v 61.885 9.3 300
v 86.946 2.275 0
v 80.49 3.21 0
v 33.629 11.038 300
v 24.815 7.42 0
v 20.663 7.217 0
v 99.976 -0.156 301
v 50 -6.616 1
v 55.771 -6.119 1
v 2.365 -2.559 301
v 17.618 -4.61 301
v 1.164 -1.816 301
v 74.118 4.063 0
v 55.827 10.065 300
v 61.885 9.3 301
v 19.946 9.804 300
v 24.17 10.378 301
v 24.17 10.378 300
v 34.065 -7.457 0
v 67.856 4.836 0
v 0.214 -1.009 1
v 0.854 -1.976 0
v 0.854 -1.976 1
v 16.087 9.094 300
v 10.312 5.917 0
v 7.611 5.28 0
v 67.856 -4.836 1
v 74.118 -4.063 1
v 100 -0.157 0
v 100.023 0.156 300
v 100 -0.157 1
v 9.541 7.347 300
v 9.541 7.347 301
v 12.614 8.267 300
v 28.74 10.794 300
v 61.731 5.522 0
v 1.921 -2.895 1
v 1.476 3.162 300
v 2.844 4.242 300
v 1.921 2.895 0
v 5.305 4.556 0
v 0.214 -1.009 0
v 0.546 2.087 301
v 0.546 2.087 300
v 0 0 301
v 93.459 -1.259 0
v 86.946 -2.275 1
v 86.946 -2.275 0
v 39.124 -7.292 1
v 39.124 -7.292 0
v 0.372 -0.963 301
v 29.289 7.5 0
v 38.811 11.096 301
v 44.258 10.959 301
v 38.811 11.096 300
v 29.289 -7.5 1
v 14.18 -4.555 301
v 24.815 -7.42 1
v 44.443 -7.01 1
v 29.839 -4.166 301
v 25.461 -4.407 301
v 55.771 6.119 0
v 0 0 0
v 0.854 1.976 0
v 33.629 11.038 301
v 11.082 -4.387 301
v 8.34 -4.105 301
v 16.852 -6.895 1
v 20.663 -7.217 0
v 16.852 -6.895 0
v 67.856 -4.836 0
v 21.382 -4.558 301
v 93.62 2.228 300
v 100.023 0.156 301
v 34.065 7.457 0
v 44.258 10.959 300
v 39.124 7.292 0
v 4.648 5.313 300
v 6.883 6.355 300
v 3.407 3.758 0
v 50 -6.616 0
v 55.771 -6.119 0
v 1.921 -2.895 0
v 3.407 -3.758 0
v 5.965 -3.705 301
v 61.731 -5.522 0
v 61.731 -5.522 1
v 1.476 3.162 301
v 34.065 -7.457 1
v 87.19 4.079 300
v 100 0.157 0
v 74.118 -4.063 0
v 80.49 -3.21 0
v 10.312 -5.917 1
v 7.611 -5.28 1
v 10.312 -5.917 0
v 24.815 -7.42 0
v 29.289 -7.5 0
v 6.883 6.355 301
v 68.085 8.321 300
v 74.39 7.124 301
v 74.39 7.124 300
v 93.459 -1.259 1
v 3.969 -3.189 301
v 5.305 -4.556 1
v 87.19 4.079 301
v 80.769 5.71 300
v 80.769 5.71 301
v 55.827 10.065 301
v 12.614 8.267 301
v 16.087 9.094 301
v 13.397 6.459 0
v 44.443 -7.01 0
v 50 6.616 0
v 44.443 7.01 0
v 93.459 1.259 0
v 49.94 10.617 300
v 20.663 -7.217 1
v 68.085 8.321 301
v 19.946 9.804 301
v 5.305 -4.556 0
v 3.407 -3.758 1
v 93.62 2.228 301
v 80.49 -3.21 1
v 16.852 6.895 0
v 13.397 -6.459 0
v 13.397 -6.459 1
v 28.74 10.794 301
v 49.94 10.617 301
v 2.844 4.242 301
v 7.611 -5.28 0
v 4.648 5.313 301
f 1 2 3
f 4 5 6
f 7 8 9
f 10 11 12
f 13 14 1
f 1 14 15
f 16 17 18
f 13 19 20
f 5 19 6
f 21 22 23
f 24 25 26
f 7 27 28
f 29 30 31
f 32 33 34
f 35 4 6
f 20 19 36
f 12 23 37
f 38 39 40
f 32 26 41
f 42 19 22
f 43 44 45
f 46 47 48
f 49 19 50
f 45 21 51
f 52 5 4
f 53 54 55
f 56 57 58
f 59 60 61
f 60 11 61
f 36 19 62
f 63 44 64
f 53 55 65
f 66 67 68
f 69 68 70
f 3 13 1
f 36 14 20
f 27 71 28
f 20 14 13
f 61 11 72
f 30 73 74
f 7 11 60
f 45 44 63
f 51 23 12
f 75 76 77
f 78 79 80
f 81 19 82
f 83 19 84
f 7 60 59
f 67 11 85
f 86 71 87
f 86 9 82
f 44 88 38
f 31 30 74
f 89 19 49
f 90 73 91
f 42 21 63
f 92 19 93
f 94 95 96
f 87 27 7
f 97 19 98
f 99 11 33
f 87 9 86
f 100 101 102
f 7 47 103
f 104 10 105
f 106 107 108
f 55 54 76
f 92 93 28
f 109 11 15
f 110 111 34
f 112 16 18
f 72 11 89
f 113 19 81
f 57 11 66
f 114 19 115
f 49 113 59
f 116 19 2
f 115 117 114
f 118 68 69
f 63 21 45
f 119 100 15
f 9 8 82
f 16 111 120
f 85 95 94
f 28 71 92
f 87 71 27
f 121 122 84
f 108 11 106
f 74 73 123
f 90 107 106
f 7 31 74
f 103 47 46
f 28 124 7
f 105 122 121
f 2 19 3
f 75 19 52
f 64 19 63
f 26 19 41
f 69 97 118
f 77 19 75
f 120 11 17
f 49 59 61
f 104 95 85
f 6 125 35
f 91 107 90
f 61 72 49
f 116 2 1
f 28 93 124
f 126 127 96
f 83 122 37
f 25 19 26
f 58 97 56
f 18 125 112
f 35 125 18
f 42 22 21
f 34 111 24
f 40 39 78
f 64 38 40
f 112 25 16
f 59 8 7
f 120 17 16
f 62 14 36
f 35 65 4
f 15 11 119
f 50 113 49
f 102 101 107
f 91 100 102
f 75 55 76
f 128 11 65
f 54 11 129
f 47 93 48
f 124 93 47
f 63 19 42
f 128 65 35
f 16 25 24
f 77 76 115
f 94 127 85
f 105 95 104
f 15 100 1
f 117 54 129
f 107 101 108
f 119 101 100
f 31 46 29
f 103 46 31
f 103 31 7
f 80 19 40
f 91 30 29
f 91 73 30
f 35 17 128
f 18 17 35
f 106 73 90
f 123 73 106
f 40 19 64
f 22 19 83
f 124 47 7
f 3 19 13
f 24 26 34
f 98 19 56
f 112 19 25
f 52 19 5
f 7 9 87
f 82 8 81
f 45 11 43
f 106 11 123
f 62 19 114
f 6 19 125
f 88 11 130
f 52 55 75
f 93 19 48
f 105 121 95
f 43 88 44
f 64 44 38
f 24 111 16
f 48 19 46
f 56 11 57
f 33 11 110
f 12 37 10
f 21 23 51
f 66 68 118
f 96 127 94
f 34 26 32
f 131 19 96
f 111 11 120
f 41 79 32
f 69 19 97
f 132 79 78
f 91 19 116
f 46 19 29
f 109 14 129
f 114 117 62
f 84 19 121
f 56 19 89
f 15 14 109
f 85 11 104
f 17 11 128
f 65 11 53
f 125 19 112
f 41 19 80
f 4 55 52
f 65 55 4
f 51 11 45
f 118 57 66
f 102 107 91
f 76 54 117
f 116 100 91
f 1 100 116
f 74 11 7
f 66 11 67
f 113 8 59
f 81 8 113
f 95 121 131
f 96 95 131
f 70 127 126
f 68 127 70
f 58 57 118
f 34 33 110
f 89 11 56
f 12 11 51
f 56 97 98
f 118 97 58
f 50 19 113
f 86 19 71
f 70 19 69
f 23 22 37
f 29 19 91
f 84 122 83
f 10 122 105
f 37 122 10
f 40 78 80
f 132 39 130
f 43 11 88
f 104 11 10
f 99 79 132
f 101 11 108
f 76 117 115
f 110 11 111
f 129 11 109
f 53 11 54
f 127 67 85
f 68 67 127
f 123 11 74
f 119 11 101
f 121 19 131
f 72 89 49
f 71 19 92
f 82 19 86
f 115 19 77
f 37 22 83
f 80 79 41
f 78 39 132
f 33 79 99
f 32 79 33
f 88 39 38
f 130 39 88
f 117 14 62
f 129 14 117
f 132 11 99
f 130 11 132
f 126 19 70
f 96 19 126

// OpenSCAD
// Copyright 2017 Evan d'Entremont. All rights reserved.
// NACA Airfoil Generator

// NACA # ABCD
// airfoil(A,B,CD)

// Cessna 172 (to scale)
//straight_wing(2,4,12,1500,5500);

// Compound wing 
compound_wing(0,0,15,4,5,15,100,300);

// needs to stay at 25 unless airfoil() is modified as well.
function x(i, datapoints = 25) = 1-cos(i*(90/(datapoints-1)));

function y_t(i, t) = (t/0.2)*((0.2969*pow( x(i),0.5))-(0.126* x(i))-(0.3516*pow( x(i),2))+(0.2843*pow( x(i),3))-(0.1015*pow( x(i),4)));

function y_c(i, c_pos, c_max) = x(i) < (c_pos/10) ? (c_max/pow((c_pos/10),2))*((2*(c_pos/10)*x(i) )-pow(x(i) ,2)) : (c_max/pow(((1-(c_pos/10))),2))*((1-(2*(c_pos/10)))+(2*(c_pos/10)*x(i) )-pow(x(i) ,2)) ;

function x_upper(i, t, c_pos, c_max) = x(i) - y_t(i, t)*(sin(atan((y_c(i, c_pos, c_max)-y_c(i-1, c_pos, c_max))/(x(i)-x(i-1) ))));

function y_upper(i, t, c_pos, c_max) = y_c(i, c_pos, c_max) + y_t(i, t)*(cos(atan((y_c(i, c_pos, c_max)-y_c(i-1, c_pos, c_max))/(x(i)-x(i-1)))));

function  x_lower(i, t, c_pos, c_max) = x(i) + y_t(i, t)*(sin(atan((y_c(i, c_pos, c_max)-y_c(i-1, c_pos, c_max, c_pos, c_max))/(x(i)-x(i-1)))));

function y_lower(i, t, c_pos, c_max) =y_c(i, c_pos, c_max) - y_t(i, t)*(cos(atan((y_c(i, c_pos, c_max)-y_c(i-1, c_pos, c_max))/(x(i)-x(i-1)))));


module straight_wing(c_max = 0, c_pos = 0, t = 15, chord =1 , span = 1){
    // Scale the height by the chord as well, the airfoil module generates a unit 1 wing.
    scale([chord,chord,span]) linear_extrude(height=1) airfoil(c_max,c_pos,t);
}

module compound_wing(c_max1 = 0, c_pos1 = 0, t1 = 15, c_max2 = 0, c_pos2 = 0, t2 = 15, chord =1 , span = 1){
  hull(){  
    scale([chord,chord,1]) linear_extrude(height=1) airfoil(c_max1,c_pos1,t1);   
    translate([0,0,span])scale([chord,chord,1]) linear_extrude(height=1) airfoil(c_max2,c_pos2, t2);
  }
}

// make the airfoil
module airfoil(NACA_maxcamber = 0, NACA_camberpos = 0, NACA_thickness = 15) {
    c_max = NACA_maxcamber/100;
    c_pos = NACA_camberpos;
    t = NACA_thickness/100;

    polygon( points=[ 
     
    // upper side front-to-back
        [0,0], 
        [x_upper(2, t, c_pos, c_max), y_upper(2, t, c_pos, c_max)],
        [x_upper(3, t, c_pos, c_max),y_upper(3, t, c_pos, c_max)],
        [x_upper(4, t, c_pos, c_max),y_upper(4, t, c_pos, c_max)],
        [x_upper(5, t, c_pos, c_max),y_upper(5, t, c_pos, c_max)],
        [x_upper(6, t, c_pos, c_max),y_upper(6, t, c_pos, c_max)],
        [x_upper(7, t, c_pos, c_max),y_upper(7, t, c_pos, c_max)],
        [x_upper(8, t, c_pos, c_max),y_upper(8, t, c_pos, c_max)],
        [x_upper(9, t, c_pos, c_max),y_upper(9, t, c_pos, c_max)],
        [x_upper(10, t, c_pos, c_max),y_upper(10, t, c_pos, c_max)],
        [x_upper(11, t, c_pos, c_max),y_upper(11, t, c_pos, c_max)],
        [x_upper(12, t, c_pos, c_max),y_upper(12, t, c_pos, c_max)],
        [x_upper(13, t, c_pos, c_max),y_upper(13, t, c_pos, c_max)],
        [x_upper(14, t, c_pos, c_max),y_upper(14, t, c_pos, c_max)],
        [x_upper(15, t, c_pos, c_max),y_upper(15, t, c_pos, c_max)],
        [x_upper(16, t, c_pos, c_max),y_upper(16, t, c_pos, c_max)],
        [x_upper(17, t, c_pos, c_max),y_upper(17, t, c_pos, c_max)],
        [x_upper(18, t, c_pos, c_max),y_upper(18, t, c_pos, c_max)],
        [x_upper(19, t, c_pos, c_max),y_upper(19, t, c_pos, c_max)],
        [x_upper(20, t, c_pos, c_max),y_upper(20, t, c_pos, c_max)],
        [x_upper(21, t, c_pos, c_max),y_upper(21, t, c_pos, c_max)],
        [x_upper(22, t, c_pos, c_max),y_upper(22, t, c_pos, c_max)],
        [x_upper(23, t, c_pos, c_max),y_upper(23, t, c_pos, c_max)],
        [x_upper(24, t, c_pos, c_max),y_upper(24, t, c_pos, c_max)],
            
        // lower side back to front
        [x_lower(24, t, c_pos, c_max), y_lower(24, t, c_pos, c_max)],
        [x_lower(23, t, c_pos, c_max), y_lower(23, t, c_pos, c_max)],
        [x_lower(22, t, c_pos, c_max), y_lower(22, t, c_pos, c_max)],
        [x_lower(21, t, c_pos, c_max), y_lower(21, t, c_pos, c_max)],
        [x_lower(20, t, c_pos, c_max), y_lower(20, t, c_pos, c_max)],
        [x_lower(19, t, c_pos, c_max), y_lower(19, t, c_pos, c_max)],
        [x_lower(18, t, c_pos, c_max), y_lower(18, t, c_pos, c_max)],
        [x_lower(17, t, c_pos, c_max), y_lower(17, t, c_pos, c_max)],
        [x_lower(16, t, c_pos, c_max), y_lower(16, t, c_pos, c_max)],
        [x_lower(15, t, c_pos, c_max), y_lower(15, t, c_pos, c_max)],
        [x_lower(14, t, c_pos, c_max), y_lower(14, t, c_pos, c_max)],
        [x_lower(13, t, c_pos, c_max), y_lower(13, t, c_pos, c_max)],
        [x_lower(12, t, c_pos, c_max), y_lower(12, t, c_pos, c_max)],
        [x_lower(11, t, c_pos, c_max), y_lower(11, t, c_pos, c_max)],
        [x_lower(10, t, c_pos, c_max), y_lower(10, t, c_pos, c_max)],
        [x_lower(9, t, c_pos, c_max), y_lower(9, t, c_pos, c_max)],
        [x_lower(8, t, c_pos, c_max), y_lower(8, t, c_pos, c_max)],
        [x_lower(7, t, c_pos, c_max), y_lower(7, t, c_pos, c_max)],
        [x_lower(6, t, c_pos, c_max), y_lower(6, t, c_pos, c_max)],
        [x_lower(5, t, c_pos, c_max), y_lower(5, t, c_pos, c_max)],
        [x_lower(4, t, c_pos, c_max), y_lower(4, t, c_pos, c_max)],
        [x_lower(3, t, c_pos, c_max), y_lower(3, t, c_pos, c_max)],
        [x_lower(2, t, c_pos, c_max), y_lower(2, t, c_pos, c_max)],
        [x_lower(1, t, c_pos, c_max), y_lower(1, t, c_pos, c_max)],
    ]
   ); 
}
